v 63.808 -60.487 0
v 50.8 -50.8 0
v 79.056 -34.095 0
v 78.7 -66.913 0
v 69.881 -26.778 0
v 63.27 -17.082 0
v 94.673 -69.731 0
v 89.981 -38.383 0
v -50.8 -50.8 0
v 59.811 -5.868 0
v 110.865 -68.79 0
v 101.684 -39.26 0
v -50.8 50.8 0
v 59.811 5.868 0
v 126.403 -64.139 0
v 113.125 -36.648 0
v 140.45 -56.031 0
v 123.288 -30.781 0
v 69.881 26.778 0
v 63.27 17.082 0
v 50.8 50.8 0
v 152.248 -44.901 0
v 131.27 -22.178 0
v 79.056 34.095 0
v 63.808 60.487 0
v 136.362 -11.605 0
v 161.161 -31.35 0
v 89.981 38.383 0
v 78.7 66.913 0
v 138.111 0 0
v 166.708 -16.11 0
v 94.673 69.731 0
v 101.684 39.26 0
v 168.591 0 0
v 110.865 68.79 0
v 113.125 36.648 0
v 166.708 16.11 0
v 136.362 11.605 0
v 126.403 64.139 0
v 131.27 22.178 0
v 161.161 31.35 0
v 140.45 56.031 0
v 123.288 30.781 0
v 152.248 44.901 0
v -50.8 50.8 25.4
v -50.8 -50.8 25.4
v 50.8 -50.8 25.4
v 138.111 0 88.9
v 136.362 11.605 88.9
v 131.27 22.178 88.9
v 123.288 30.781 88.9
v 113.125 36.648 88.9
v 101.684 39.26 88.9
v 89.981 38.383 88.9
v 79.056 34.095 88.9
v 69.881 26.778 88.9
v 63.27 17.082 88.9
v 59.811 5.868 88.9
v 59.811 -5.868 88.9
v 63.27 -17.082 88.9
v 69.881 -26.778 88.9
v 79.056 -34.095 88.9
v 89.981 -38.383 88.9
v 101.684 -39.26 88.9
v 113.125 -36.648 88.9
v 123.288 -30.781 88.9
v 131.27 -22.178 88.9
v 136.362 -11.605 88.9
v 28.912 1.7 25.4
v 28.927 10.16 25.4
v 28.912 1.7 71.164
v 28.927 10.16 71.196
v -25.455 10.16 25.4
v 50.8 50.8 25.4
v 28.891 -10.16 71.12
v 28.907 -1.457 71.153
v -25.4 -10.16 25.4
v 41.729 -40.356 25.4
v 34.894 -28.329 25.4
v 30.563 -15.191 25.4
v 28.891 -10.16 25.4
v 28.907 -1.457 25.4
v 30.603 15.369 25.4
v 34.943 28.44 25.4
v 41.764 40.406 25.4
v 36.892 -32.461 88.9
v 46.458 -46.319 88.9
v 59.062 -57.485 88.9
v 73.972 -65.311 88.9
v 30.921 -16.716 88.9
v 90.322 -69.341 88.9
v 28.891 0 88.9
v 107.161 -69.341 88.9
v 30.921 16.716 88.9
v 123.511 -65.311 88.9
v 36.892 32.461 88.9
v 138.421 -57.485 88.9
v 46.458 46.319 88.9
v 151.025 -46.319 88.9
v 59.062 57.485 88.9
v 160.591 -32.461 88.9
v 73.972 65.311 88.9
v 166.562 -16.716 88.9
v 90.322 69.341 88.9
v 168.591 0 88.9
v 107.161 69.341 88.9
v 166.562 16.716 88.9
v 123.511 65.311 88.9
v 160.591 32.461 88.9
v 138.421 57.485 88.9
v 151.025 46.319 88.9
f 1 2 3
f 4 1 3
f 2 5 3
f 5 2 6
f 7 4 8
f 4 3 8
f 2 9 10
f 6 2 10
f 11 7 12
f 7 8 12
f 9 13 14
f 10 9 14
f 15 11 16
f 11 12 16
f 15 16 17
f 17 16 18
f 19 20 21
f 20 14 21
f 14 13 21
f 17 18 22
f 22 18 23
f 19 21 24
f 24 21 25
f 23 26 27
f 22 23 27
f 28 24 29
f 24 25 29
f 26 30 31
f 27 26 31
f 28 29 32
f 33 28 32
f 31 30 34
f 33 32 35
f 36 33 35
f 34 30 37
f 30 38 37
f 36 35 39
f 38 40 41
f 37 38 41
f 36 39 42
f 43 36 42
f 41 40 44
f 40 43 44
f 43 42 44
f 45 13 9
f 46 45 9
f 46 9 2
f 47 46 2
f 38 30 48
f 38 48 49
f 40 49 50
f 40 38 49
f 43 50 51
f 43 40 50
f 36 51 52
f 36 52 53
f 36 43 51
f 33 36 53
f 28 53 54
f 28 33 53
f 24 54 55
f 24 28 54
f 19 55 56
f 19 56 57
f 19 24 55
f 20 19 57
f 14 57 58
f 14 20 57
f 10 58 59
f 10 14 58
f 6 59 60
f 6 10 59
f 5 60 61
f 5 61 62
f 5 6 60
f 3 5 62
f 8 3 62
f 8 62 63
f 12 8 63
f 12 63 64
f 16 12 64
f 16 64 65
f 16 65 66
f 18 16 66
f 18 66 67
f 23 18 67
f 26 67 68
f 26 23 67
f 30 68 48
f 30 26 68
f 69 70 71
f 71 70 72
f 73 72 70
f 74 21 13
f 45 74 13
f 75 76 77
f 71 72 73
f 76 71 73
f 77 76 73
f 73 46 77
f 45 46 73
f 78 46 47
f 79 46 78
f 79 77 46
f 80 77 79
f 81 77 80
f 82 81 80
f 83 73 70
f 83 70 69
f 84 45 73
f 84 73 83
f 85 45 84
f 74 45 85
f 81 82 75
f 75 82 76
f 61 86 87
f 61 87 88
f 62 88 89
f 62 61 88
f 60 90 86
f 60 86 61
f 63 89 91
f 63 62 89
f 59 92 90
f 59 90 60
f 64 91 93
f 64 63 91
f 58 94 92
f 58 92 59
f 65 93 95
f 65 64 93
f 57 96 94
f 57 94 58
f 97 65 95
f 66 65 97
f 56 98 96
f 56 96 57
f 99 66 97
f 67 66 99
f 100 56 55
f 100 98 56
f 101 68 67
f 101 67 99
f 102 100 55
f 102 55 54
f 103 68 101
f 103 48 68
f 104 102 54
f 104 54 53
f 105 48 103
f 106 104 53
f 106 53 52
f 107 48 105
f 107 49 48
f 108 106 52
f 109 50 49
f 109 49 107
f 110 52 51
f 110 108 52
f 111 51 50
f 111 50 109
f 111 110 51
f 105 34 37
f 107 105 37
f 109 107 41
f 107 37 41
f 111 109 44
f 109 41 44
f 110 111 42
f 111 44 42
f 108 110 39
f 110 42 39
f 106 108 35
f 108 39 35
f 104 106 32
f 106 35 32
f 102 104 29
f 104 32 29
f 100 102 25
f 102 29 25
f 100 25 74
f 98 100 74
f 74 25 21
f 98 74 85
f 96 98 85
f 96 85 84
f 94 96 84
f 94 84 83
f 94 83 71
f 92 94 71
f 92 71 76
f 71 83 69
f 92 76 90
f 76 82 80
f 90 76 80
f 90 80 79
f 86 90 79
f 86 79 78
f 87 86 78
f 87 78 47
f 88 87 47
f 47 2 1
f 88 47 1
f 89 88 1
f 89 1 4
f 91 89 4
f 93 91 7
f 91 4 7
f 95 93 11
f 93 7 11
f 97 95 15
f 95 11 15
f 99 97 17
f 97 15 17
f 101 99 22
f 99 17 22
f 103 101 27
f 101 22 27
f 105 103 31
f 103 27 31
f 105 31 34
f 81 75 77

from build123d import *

# Parameters (mm, degrees)
F0_R     = 39.37
F1_DEPTH = 88.9
F2_DEPTH = 25.4
F5_DEPTH = 20.32
F5_TAPER = -0.1


with BuildPart() as f1:
    # F0 (on Top) → F1 (new body)
    with BuildSketch(Plane.XY):
        with BuildLine():
            ThreePointArc((168.591448664, 0), (126.4029047972, 64.1394289388), (50.8, 50.8))
            ThreePointArc((50.8, 50.8), (28.891448664, 0), (50.8, -50.8))
            ThreePointArc((50.8, -50.8), (126.4029047972, -64.1394289388), (168.591448664, 0))
        make_face()
        with Locations((98.741448664, 0)):
            Circle(F0_R, mode=Mode.SUBTRACT)
    extrude(amount=F1_DEPTH)

    # F0 (on Top) → F2 (join)
    with BuildSketch(Plane.XY):
        with BuildLine():
            Line((50.8, 50.8), (-50.8, 50.8))
            Line((-50.8, 50.8), (-50.8, -50.8))
            Line((-50.8, -50.8), (50.8, -50.8))
            ThreePointArc((50.8, -50.8), (28.891448664, 0), (50.8, 50.8))
        make_face()
    extrude(amount=F2_DEPTH)

    # F4 (on offset) → F5 (join)
    with BuildSketch(Plane.XZ.offset(10.16)):
        Polygon((28.891448664, 25.4), (28.891448664, 71.12), (-25.4, 25.4), align=None)
    extrude(amount=-F5_DEPTH, taper=F5_TAPER)


solid = f1.part
